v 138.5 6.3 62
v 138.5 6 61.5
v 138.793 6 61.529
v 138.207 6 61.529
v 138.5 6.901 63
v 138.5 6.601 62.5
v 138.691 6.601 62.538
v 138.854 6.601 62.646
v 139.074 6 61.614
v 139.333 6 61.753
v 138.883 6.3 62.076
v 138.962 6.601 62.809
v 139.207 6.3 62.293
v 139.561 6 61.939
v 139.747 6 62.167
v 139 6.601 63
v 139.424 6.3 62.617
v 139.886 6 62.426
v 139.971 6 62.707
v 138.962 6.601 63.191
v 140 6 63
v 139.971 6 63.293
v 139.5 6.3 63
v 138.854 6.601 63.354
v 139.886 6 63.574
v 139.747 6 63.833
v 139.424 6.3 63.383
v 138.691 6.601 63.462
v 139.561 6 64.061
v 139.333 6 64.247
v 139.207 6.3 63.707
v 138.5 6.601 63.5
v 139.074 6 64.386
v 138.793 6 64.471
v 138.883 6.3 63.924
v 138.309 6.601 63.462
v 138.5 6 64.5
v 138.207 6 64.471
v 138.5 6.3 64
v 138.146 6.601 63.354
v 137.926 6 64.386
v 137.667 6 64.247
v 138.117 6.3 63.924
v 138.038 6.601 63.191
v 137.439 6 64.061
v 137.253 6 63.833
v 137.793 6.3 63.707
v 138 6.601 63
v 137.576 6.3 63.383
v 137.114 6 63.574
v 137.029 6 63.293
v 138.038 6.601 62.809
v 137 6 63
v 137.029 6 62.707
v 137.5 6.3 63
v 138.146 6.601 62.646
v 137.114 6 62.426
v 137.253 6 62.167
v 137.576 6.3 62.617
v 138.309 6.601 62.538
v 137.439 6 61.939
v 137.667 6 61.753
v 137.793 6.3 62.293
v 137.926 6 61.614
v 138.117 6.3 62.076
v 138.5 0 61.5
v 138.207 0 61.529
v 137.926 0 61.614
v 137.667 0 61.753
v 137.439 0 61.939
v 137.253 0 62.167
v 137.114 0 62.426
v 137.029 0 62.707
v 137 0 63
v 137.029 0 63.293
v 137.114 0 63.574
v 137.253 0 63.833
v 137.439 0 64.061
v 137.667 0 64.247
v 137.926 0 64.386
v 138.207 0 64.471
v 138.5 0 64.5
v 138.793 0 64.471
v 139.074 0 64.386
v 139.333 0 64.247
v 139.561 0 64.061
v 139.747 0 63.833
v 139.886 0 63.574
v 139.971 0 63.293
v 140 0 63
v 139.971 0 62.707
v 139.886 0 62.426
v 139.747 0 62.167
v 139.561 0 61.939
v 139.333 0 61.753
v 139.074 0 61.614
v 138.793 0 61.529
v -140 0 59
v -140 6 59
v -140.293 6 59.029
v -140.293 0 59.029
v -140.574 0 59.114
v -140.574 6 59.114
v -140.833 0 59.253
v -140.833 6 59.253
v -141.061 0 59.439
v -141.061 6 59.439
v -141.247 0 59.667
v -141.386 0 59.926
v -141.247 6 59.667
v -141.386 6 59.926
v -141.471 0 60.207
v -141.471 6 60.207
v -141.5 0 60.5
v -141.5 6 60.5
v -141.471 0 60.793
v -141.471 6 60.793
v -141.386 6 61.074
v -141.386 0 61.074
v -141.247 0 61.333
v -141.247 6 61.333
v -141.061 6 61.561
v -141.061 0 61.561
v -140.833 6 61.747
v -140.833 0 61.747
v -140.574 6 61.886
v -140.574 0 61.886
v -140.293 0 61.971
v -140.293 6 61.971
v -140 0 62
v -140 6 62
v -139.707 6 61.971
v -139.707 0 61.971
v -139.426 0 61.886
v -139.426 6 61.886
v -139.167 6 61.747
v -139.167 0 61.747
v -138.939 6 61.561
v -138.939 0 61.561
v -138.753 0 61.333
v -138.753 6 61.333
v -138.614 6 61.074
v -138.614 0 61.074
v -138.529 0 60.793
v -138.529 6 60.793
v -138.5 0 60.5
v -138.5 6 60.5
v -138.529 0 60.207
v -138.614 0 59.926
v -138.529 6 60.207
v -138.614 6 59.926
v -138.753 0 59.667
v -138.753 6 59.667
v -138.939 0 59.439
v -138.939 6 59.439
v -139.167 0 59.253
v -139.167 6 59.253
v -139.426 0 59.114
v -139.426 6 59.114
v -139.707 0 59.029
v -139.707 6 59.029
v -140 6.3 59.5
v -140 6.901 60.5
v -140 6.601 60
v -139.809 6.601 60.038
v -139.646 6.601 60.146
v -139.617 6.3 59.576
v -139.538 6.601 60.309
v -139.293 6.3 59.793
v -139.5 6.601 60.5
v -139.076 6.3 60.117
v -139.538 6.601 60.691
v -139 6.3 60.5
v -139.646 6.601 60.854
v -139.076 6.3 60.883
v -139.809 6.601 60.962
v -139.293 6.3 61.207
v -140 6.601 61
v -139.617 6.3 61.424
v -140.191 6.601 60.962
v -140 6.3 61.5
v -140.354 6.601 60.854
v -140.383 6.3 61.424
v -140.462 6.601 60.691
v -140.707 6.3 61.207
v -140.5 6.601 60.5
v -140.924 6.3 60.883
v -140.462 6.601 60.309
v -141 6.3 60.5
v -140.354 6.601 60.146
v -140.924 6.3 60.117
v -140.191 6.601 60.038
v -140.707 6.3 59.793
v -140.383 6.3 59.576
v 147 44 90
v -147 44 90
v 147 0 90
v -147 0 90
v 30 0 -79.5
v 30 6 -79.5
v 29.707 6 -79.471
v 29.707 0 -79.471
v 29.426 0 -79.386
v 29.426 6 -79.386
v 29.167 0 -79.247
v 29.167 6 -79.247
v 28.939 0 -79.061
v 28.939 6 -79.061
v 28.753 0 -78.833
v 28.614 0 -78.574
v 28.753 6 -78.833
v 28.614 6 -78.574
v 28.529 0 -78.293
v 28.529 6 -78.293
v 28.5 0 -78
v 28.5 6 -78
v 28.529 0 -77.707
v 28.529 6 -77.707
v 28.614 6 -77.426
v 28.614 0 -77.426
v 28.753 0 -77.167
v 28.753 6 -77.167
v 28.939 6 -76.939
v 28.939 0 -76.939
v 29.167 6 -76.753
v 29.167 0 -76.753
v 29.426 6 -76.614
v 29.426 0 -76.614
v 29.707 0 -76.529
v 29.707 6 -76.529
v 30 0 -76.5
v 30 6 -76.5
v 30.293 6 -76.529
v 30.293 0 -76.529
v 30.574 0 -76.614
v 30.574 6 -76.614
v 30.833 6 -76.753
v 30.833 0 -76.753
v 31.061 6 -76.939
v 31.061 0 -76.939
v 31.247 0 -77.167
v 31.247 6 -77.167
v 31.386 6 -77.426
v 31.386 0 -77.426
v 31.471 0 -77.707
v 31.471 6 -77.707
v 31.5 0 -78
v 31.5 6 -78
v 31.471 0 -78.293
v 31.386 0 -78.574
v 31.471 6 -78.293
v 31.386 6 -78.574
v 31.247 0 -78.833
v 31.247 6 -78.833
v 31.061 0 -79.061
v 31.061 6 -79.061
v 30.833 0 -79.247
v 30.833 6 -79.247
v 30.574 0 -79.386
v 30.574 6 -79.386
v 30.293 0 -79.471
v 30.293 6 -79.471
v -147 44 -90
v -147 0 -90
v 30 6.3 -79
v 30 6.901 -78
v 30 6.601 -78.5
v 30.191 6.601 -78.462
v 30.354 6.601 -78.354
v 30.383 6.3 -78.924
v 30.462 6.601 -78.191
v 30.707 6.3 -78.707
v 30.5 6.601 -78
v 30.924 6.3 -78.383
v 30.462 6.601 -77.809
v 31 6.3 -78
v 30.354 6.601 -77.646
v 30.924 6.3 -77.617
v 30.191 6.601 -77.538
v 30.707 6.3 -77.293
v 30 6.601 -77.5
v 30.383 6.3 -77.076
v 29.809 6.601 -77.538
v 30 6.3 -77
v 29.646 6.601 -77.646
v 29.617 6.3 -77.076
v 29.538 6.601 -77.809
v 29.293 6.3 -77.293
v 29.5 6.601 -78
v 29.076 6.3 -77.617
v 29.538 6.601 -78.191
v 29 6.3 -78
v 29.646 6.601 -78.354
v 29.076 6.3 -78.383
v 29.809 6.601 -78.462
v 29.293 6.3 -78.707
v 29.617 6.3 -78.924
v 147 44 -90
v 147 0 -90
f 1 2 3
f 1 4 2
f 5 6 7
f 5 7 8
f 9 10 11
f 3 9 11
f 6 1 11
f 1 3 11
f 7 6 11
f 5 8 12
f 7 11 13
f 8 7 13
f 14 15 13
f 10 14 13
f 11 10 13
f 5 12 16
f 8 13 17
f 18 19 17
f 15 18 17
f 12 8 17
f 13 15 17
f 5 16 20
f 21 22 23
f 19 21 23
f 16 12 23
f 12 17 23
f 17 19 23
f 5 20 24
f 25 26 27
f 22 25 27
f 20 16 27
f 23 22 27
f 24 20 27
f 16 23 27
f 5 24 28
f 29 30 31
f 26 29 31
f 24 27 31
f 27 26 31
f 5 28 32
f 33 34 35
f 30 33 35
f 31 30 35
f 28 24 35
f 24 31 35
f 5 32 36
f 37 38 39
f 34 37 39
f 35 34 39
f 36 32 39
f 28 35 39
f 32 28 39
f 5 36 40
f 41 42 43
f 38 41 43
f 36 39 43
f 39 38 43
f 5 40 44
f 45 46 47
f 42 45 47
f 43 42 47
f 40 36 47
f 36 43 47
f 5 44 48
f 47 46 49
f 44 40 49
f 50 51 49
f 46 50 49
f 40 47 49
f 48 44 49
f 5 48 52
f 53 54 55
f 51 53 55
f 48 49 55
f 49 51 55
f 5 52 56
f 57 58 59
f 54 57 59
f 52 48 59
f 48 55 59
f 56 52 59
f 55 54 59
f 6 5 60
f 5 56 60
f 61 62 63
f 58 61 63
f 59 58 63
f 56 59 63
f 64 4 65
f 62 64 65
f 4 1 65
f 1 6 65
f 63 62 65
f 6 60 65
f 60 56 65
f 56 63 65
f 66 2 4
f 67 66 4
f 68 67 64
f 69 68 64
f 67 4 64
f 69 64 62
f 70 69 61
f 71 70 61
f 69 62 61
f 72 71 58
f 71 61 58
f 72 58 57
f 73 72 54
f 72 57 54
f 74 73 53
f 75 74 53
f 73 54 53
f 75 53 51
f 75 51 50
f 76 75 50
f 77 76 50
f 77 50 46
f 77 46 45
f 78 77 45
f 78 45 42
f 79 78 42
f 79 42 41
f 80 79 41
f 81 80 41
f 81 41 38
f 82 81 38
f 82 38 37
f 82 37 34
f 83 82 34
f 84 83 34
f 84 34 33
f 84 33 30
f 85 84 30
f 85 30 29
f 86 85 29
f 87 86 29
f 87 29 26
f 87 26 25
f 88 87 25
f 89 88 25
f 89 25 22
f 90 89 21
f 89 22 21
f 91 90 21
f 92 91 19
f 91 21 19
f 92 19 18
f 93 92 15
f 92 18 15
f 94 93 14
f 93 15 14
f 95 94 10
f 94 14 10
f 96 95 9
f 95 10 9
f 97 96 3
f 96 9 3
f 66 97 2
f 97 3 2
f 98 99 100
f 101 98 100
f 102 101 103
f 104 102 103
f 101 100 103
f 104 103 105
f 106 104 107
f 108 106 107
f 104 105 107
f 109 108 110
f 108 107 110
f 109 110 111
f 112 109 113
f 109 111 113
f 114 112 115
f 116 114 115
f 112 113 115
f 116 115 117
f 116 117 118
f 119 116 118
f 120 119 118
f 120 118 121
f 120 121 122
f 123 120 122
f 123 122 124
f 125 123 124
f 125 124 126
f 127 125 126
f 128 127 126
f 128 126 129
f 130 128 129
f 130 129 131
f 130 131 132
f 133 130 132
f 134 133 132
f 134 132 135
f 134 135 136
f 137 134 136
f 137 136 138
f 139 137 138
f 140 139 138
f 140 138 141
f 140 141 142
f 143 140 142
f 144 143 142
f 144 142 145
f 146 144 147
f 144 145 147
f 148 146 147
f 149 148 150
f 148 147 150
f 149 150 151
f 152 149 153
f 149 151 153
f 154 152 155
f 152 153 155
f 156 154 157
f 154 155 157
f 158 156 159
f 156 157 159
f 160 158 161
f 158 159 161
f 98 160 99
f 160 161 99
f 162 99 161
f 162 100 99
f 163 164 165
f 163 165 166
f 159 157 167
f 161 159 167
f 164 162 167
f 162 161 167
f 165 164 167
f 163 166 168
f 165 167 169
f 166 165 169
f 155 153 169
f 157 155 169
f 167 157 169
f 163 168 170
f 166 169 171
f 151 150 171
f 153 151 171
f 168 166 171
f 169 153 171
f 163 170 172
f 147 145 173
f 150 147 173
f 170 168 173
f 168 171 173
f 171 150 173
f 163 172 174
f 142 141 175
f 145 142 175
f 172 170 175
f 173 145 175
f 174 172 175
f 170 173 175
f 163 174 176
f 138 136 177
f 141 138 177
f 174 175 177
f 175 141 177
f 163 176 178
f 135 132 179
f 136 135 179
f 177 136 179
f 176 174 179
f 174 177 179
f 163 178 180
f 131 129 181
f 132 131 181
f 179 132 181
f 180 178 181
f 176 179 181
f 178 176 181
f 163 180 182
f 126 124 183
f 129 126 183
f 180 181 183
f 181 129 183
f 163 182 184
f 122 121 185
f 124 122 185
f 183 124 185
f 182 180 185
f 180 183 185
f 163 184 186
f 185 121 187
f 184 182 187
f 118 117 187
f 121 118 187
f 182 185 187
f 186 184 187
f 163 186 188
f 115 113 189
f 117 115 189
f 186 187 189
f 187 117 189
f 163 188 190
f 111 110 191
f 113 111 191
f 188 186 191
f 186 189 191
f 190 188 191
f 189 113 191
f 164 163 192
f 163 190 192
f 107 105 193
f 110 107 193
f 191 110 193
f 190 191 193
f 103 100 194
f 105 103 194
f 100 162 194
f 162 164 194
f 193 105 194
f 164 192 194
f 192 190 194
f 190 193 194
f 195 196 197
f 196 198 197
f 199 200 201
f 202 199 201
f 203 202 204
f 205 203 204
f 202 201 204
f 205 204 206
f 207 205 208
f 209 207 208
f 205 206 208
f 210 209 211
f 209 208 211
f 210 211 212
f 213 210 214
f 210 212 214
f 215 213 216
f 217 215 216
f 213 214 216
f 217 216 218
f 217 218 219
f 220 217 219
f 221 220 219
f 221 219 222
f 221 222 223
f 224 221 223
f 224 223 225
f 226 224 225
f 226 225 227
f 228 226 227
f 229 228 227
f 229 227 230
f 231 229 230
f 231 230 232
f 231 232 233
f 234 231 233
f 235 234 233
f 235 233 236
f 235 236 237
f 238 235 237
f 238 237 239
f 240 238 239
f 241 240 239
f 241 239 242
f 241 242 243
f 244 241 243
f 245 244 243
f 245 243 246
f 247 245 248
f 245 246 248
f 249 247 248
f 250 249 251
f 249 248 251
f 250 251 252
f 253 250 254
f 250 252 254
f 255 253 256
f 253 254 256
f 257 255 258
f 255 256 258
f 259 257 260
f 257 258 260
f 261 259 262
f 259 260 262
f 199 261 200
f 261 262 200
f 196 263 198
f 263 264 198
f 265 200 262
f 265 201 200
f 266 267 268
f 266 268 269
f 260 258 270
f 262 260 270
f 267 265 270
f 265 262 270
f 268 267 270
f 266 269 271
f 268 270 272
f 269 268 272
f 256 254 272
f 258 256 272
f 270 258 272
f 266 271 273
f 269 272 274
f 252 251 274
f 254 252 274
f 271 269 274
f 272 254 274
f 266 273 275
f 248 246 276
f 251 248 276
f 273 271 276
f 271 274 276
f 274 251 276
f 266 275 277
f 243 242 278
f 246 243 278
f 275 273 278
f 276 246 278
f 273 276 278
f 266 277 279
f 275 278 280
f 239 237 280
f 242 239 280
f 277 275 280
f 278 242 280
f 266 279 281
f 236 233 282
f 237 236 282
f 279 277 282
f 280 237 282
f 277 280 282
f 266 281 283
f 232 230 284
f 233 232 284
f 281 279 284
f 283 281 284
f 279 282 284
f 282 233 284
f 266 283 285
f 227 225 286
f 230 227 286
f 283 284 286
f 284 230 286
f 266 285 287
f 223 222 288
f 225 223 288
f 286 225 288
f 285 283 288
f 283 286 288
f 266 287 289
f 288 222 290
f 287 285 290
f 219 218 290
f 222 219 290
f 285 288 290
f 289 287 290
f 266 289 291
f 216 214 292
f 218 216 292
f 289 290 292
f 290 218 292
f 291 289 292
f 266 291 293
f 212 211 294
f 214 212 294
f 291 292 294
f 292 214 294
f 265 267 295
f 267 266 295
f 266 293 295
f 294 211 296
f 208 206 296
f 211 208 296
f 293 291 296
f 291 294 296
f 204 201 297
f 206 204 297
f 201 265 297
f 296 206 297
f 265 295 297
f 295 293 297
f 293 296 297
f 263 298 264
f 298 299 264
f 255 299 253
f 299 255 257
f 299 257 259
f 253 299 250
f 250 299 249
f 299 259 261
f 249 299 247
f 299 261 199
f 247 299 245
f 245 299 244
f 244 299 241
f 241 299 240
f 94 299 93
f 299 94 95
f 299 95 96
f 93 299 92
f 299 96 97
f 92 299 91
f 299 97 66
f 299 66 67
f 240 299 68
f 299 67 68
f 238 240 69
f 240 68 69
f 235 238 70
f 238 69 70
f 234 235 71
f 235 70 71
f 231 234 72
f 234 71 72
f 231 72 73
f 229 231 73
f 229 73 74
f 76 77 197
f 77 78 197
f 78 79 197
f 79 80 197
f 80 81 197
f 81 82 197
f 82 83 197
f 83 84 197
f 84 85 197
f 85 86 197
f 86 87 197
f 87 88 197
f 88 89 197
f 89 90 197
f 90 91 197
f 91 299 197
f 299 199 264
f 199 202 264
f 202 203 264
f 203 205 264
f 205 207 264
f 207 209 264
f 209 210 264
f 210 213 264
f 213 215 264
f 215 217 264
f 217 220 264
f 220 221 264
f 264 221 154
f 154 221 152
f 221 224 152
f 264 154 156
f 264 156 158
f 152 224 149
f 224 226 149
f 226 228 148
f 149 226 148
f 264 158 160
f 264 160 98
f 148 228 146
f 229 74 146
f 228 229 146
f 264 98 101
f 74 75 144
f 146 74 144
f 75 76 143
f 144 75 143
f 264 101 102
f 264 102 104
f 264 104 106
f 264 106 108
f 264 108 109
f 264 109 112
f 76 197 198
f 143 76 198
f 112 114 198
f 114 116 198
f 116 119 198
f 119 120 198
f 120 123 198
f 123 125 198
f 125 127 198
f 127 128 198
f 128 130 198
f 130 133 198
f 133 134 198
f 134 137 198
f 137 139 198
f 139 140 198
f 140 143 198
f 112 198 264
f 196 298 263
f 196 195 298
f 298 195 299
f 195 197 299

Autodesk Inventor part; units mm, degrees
ref_plane "YZ Plane" through (0, 0, 0) normal (1, 0, 0) x (0, 1, 0)
ref_plane "XZ Plane" through (0, 0, 0) normal (0, 1, 0) x (-1, 0, 0)
ref_plane "XY Plane" through (0, 0, 0) normal (0, 0, 1) x (1, 0, 0)
sketch "Sketch1" plane through (0, 0, 0) normal (0, 1, 0) x (-1, 0, 0)
  line L0 (-147, -90) -> (147, -90)
  line L1 (147, -90) -> (147, 90)
  line L2 (147, 90) -> (-147, 90)
  line L3 (-147, 90) -> (-147, -90)
  line L4 (-147, -90) -> (147, 90) construction
  line L5 (147, -90) -> (-147, 90) construction
  point P0 (0, 0)
  dimension "d0" = 294
  dimension "d1" = 180
extrude "Extrusion1" add sketch "Sketch1" along normal blind 44
sketch "Sketch3" plane through (0, 0, 0) normal (0, -1, 0) x (1, 0, 0)
  line L0 (147, -90) -> (-147, -90) projected
  line L1 (147, 90) -> (147, -90) projected
  line L2 (-147, 90) -> (147, 90) projected
  line L3 (-147, -90) -> (-147, 90) projected
  point P0 (0, 0)
  point P1 (-140, 60.5)
  point P2 (30, -78)
  point P3 (138.5, 63)
  dimension "d7" = 7
  dimension "d8" = 29.5
  dimension "d9" = 12
  dimension "d11" = 117
  dimension "d12" = 8.5
  dimension "d13" = 27
hole "Hole1" at (-140, 0, 60.5) at (30, 0, -78) at (138.5, 0, 63) direction (0, 1, 0) diameter 3 depth 6 tip angle 118
properties part number "tl_sg1024"
